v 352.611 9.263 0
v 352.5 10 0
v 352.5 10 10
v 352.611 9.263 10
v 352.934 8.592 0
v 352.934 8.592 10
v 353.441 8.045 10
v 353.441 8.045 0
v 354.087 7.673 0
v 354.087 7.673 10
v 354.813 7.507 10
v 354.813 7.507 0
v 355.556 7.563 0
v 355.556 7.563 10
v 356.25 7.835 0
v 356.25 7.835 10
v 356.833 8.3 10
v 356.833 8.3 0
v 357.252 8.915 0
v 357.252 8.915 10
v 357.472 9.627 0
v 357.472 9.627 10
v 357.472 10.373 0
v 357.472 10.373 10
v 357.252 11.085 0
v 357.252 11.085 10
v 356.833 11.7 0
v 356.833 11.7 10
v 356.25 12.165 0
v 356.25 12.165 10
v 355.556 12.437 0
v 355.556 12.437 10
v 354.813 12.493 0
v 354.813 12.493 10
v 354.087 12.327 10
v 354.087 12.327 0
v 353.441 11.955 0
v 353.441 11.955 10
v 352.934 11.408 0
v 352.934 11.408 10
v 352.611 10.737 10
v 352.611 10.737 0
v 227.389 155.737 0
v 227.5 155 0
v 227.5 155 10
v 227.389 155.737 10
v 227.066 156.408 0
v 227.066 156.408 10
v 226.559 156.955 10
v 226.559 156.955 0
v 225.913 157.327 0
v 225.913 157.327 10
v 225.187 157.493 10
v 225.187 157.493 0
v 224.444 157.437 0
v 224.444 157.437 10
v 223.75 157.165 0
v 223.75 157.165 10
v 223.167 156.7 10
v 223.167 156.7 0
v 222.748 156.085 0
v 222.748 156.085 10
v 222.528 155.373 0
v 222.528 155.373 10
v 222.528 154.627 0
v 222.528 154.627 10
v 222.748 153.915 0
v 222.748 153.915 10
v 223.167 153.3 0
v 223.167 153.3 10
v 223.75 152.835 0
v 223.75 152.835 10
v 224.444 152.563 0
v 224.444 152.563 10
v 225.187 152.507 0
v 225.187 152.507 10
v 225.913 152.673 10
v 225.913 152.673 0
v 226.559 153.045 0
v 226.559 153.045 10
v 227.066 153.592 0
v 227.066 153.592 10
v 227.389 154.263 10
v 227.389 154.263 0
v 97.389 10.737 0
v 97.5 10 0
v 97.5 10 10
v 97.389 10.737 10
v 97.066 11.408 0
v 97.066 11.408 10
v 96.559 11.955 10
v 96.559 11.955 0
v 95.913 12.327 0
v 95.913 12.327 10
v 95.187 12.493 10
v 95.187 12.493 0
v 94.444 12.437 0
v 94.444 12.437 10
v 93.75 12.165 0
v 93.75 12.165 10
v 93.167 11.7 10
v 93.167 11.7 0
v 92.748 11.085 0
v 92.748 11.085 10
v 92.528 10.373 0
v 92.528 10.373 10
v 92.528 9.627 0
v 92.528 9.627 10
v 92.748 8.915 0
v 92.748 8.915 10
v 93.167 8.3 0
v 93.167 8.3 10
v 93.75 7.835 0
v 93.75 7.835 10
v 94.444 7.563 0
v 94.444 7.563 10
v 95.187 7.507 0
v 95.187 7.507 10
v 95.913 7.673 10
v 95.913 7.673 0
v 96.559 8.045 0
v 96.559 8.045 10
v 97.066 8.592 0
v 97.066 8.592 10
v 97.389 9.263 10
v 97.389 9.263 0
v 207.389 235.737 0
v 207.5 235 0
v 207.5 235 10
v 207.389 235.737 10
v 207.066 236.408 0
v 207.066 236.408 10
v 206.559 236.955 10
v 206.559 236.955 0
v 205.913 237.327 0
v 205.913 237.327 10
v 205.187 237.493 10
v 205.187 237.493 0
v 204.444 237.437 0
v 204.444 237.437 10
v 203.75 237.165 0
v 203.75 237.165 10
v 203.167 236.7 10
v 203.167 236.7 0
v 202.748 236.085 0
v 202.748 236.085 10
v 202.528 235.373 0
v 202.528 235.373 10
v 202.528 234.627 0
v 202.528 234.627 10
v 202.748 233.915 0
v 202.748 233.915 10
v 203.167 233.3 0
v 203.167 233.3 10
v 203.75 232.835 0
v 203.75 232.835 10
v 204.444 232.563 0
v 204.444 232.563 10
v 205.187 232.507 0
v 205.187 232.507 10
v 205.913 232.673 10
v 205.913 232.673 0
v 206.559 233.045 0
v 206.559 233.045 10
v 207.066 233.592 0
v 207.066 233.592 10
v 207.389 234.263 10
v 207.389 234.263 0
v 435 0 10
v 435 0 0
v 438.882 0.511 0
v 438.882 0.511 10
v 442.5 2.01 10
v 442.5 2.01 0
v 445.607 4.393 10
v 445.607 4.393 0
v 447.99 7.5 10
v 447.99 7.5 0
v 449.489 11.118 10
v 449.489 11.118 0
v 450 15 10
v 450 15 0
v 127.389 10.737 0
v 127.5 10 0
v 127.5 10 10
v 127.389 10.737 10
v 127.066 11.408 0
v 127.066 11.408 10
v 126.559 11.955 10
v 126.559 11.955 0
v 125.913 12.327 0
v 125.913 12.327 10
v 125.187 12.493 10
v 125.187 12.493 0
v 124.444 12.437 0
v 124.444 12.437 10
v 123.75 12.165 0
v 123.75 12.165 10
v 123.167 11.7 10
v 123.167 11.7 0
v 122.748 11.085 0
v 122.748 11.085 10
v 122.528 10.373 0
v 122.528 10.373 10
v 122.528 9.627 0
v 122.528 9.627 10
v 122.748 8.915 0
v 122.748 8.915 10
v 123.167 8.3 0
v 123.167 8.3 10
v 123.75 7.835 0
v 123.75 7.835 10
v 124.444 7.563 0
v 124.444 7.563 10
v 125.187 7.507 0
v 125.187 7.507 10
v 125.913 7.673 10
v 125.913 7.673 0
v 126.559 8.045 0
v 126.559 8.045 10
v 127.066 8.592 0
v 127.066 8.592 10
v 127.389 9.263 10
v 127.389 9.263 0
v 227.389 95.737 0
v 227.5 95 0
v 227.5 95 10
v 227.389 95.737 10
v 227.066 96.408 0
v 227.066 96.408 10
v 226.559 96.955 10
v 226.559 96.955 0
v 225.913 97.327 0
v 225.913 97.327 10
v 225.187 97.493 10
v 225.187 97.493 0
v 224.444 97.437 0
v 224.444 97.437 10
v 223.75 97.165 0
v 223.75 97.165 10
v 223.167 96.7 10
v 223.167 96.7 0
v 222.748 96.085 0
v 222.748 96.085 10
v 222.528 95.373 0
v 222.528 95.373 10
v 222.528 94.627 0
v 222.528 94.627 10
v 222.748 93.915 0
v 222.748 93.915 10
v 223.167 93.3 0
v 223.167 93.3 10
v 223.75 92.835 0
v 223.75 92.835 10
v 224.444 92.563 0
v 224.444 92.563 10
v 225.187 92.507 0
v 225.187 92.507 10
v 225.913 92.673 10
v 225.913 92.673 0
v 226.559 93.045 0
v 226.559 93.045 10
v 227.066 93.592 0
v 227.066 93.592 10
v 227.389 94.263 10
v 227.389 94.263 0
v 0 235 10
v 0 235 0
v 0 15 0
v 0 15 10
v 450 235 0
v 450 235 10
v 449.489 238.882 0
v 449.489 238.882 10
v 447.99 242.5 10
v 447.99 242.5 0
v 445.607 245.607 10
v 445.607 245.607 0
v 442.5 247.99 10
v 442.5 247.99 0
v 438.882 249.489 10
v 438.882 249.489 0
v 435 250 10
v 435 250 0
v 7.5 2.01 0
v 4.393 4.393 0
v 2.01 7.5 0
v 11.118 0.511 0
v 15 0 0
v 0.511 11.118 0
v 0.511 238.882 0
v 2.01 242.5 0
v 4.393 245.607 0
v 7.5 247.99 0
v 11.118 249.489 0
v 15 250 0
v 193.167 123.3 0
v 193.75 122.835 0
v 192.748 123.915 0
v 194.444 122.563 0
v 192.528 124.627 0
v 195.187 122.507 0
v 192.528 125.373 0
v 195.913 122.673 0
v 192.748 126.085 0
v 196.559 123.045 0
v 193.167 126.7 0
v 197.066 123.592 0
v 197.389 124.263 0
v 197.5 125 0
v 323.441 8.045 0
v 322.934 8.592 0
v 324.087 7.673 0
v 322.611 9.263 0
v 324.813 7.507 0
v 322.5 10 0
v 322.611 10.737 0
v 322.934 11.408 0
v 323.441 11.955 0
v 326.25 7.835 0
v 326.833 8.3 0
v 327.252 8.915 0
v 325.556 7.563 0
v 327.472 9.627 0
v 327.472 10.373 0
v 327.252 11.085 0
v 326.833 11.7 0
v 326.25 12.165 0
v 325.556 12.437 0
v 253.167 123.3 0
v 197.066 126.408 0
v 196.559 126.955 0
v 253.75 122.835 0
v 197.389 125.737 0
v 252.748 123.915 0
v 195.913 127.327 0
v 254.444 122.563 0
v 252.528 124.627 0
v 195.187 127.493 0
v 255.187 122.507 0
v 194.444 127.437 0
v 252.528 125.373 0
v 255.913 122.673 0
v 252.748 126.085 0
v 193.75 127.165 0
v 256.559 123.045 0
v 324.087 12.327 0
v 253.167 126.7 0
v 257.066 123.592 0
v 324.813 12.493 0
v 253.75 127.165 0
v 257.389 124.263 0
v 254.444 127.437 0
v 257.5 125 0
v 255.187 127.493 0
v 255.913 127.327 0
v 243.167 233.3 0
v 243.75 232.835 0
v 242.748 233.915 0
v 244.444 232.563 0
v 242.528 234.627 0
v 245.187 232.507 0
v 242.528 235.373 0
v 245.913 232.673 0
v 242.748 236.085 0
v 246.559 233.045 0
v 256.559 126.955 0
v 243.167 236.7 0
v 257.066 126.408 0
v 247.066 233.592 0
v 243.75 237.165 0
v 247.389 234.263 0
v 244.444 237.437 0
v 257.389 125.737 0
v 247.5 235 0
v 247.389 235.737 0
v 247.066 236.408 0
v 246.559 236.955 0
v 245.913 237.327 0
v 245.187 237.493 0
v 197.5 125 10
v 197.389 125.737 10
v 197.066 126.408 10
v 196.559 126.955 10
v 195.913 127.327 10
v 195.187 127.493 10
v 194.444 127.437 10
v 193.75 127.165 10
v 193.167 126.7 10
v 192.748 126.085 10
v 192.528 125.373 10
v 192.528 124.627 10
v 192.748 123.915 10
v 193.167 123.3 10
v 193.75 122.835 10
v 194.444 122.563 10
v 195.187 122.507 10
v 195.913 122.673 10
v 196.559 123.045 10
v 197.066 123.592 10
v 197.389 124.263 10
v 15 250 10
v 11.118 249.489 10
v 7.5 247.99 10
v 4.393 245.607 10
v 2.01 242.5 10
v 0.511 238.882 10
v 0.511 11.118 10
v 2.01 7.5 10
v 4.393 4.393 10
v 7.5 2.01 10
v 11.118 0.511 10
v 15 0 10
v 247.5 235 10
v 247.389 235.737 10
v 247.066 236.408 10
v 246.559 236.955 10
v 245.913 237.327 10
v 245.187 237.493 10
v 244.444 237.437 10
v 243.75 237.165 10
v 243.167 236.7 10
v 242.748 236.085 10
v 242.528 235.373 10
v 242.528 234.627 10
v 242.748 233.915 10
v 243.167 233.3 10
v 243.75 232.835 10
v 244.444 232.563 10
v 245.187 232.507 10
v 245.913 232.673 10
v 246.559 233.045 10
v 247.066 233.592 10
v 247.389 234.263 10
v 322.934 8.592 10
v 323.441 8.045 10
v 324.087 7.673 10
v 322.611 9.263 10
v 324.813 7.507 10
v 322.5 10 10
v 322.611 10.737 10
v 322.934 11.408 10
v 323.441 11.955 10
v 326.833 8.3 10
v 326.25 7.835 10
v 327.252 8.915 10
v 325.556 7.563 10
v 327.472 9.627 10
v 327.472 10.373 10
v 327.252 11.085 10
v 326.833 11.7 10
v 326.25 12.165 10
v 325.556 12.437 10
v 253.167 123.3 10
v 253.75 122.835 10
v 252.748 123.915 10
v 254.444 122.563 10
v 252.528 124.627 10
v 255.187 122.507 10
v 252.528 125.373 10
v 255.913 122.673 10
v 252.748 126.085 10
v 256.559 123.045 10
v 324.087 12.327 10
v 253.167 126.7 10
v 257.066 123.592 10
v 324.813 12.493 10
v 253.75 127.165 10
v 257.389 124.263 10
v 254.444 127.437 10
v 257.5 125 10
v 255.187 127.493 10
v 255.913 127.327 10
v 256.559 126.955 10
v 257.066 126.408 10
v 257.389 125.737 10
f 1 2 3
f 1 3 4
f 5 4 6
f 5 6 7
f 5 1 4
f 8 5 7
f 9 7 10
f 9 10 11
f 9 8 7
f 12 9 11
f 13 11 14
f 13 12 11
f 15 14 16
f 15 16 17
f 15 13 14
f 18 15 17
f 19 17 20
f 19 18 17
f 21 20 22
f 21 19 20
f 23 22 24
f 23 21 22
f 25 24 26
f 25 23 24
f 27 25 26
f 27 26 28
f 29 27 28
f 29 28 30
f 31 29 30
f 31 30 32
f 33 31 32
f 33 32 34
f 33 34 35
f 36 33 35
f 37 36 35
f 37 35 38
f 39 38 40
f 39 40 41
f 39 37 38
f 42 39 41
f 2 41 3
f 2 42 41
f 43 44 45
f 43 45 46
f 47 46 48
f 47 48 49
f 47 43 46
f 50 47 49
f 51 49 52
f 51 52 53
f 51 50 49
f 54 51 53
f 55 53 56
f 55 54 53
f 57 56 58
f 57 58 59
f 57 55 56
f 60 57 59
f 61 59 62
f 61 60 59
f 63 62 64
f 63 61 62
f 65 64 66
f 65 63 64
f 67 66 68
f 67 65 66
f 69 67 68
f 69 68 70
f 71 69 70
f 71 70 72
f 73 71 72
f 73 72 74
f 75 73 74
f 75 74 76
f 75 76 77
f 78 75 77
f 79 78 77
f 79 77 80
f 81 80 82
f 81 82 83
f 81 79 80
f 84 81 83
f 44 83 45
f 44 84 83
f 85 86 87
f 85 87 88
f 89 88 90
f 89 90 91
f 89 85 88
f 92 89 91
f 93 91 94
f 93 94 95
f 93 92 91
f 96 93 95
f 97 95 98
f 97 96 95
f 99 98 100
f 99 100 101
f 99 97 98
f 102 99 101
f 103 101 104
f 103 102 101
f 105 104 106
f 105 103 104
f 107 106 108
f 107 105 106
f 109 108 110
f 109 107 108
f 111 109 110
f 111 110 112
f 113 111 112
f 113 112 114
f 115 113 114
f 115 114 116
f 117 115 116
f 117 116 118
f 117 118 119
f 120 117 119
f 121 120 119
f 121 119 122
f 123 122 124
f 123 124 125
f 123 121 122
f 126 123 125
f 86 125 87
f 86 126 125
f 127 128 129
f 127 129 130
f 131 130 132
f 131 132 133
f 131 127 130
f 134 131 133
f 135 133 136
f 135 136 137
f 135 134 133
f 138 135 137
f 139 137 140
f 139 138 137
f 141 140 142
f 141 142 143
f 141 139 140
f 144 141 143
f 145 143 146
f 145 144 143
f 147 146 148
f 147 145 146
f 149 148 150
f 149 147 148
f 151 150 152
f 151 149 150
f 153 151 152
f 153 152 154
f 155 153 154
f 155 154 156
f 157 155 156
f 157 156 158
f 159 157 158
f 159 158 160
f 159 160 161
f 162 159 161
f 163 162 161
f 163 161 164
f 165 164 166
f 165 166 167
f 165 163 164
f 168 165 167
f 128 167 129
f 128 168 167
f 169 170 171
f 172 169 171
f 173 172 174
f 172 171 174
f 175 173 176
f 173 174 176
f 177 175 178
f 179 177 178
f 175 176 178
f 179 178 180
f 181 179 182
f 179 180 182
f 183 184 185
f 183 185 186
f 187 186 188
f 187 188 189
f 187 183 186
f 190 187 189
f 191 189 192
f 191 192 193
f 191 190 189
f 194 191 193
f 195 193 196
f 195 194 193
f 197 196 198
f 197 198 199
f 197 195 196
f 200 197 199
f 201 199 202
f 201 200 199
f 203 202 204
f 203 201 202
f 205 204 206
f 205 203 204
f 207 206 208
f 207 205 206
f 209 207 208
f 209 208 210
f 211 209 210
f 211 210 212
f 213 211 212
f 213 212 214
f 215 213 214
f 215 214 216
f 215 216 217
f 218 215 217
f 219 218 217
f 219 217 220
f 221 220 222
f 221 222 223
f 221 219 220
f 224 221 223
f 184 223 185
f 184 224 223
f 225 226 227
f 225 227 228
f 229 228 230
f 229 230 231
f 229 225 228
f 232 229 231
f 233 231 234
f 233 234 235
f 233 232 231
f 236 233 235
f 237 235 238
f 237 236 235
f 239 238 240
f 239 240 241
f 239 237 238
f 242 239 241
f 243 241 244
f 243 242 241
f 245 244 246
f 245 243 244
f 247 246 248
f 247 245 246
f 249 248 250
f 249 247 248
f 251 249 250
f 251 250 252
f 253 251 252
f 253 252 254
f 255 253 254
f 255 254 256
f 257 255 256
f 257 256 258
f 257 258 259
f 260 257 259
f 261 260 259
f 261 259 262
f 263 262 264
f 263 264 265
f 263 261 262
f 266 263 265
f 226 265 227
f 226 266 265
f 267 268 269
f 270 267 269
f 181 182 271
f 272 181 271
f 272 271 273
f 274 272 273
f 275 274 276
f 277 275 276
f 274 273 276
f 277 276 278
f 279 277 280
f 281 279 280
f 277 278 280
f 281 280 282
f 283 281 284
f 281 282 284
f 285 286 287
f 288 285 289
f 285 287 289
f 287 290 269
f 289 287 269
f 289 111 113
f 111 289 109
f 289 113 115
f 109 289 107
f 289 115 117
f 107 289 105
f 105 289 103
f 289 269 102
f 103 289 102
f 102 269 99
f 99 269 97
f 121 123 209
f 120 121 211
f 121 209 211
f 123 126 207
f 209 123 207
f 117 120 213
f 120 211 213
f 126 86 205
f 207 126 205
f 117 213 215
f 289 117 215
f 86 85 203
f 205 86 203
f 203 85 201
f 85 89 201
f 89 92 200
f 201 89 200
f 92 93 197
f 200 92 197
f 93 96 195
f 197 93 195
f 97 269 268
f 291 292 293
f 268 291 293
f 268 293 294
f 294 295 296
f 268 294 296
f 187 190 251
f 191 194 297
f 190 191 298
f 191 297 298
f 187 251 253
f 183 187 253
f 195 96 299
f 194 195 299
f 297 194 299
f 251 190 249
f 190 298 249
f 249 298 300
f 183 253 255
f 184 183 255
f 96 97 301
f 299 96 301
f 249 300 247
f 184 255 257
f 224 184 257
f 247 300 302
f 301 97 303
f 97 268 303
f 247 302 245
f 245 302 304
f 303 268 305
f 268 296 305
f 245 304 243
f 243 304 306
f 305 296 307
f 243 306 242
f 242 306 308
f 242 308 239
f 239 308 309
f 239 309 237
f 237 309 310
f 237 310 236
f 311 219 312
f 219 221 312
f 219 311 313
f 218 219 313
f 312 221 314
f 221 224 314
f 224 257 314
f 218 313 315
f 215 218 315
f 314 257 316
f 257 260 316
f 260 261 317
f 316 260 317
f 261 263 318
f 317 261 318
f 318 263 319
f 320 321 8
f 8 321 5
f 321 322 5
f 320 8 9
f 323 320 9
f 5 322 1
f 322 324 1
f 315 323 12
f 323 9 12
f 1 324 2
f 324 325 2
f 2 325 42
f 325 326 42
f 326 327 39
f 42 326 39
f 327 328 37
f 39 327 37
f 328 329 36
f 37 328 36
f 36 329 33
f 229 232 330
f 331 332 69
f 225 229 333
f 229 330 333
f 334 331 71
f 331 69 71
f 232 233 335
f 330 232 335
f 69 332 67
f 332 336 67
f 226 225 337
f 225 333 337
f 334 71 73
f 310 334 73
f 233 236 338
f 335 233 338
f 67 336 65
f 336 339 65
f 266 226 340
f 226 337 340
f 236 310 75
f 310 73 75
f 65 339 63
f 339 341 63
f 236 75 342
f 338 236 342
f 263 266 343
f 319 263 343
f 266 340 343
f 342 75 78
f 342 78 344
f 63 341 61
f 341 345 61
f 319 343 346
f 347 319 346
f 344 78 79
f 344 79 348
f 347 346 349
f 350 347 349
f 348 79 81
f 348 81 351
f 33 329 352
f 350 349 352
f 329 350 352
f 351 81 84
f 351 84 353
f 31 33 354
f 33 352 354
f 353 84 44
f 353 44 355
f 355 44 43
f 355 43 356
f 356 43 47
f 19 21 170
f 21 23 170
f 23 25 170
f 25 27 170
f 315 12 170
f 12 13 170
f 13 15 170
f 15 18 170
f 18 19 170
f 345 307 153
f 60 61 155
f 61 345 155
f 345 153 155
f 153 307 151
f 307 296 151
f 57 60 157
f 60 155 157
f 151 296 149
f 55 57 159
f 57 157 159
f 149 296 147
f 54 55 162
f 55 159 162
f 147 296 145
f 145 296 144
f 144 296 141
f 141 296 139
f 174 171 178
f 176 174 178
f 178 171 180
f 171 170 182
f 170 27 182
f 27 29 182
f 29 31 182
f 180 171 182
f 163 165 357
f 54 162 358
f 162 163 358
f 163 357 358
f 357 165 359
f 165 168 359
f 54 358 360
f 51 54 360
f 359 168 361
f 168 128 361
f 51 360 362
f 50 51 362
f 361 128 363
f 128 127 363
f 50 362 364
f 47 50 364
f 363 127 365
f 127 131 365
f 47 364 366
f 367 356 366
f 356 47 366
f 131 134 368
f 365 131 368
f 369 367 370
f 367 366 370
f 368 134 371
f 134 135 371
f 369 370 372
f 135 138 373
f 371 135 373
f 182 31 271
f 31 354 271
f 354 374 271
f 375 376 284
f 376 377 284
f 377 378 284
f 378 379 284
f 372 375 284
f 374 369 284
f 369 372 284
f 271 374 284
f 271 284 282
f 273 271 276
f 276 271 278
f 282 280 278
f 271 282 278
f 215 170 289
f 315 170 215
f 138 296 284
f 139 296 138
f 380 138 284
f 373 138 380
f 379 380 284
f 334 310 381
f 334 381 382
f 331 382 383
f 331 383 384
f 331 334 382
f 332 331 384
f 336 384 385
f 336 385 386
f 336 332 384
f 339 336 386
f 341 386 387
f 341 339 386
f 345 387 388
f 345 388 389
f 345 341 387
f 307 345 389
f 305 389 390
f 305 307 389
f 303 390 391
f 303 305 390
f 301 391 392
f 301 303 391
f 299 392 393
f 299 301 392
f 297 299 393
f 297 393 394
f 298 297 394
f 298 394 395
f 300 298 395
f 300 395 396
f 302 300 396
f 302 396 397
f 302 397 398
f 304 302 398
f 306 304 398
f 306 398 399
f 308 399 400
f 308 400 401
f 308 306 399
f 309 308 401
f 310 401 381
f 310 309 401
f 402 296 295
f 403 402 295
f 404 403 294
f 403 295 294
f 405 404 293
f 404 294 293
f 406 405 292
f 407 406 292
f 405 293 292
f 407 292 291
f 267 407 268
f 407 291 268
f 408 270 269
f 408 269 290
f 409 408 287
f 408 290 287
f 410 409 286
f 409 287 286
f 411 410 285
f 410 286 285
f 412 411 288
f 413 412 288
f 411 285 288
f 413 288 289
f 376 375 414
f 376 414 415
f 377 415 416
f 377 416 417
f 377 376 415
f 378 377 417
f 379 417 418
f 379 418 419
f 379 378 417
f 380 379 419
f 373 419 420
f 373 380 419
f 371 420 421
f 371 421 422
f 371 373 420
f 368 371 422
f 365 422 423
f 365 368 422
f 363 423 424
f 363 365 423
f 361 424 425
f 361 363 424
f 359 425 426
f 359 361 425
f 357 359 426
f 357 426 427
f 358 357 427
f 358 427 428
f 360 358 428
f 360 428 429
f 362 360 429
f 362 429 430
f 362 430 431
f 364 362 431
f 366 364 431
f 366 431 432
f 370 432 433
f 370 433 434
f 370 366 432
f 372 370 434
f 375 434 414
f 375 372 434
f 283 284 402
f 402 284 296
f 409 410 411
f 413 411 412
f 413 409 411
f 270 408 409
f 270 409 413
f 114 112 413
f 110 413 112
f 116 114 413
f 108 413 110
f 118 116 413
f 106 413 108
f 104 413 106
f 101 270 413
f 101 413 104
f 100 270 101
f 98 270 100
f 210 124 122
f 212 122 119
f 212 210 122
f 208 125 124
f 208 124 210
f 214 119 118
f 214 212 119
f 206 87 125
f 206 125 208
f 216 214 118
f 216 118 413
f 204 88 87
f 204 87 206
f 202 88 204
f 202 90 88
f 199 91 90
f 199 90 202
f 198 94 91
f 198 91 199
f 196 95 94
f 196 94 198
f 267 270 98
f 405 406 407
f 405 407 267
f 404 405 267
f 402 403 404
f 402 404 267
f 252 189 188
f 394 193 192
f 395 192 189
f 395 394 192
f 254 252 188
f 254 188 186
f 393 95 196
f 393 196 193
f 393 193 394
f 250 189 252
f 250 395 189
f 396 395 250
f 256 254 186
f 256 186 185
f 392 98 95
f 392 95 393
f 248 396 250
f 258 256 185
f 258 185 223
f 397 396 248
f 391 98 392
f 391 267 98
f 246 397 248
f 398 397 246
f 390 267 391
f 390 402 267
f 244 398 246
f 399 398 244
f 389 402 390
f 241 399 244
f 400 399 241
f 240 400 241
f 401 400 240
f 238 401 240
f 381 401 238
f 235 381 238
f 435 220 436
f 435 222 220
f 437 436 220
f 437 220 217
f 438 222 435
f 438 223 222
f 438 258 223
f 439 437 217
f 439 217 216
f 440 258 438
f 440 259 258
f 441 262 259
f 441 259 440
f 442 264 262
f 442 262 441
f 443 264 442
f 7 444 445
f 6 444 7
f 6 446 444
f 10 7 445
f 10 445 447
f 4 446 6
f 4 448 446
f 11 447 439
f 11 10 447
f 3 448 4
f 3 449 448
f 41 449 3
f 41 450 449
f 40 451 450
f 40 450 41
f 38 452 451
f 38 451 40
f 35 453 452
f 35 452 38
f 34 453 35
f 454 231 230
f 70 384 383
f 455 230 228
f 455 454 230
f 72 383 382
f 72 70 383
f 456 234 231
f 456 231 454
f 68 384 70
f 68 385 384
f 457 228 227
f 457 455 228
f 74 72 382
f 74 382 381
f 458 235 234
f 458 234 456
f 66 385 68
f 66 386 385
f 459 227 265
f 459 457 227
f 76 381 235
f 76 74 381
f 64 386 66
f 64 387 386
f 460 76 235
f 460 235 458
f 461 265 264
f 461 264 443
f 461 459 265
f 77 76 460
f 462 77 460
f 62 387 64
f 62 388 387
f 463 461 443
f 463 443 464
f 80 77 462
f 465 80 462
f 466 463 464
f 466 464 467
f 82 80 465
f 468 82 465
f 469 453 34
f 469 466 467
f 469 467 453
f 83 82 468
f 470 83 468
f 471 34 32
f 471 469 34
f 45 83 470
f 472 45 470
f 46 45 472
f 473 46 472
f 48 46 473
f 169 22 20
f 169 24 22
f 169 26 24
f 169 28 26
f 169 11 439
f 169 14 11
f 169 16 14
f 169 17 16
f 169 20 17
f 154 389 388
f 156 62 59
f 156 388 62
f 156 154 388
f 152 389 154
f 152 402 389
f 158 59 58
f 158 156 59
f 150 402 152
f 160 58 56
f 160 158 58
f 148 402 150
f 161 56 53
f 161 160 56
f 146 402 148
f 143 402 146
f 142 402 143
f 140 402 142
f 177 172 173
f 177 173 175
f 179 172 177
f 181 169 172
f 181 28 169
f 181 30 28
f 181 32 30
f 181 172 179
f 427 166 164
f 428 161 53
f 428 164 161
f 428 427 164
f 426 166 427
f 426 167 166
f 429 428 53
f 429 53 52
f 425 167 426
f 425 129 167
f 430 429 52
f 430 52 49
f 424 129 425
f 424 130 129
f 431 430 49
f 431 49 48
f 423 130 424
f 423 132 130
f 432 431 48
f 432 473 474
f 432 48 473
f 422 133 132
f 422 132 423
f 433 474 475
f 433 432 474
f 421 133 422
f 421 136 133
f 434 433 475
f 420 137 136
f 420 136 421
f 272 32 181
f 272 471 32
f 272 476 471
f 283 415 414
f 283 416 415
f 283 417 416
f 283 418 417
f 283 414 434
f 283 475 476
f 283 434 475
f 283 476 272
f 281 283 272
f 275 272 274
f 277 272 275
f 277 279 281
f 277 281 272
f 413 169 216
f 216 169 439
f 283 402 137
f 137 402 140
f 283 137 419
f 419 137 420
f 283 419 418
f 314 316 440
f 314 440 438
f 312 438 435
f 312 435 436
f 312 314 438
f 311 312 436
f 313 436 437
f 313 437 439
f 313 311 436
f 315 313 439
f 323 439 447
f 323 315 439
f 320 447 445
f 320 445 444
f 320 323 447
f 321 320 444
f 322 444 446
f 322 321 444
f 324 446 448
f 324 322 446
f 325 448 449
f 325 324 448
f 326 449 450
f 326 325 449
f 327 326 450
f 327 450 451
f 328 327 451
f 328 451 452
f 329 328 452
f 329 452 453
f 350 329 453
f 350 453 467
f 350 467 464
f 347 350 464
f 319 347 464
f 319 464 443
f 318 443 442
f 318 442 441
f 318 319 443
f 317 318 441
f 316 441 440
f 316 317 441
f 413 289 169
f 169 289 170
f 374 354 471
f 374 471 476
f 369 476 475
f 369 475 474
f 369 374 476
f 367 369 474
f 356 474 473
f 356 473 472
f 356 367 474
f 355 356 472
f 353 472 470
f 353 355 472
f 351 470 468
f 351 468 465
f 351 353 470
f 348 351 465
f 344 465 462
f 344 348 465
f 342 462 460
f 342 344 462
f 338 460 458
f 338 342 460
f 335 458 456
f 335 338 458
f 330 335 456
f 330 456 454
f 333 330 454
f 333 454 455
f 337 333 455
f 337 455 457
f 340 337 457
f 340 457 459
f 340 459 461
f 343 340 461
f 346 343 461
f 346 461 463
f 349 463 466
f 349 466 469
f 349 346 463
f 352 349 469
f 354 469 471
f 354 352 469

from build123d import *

# Parameters (mm, degrees)
CROQUIS1_R              = 2.5
SALIENTE_EXTRUIR1_DEPTH = 10


with BuildPart() as part:
    # Croquis1 → Saliente-Extruir1 (new body)
    with BuildSketch(Plane.XY):
        with BuildLine():
            Line((15, 0), (435, 0))
            ThreePointArc((435, 0), (445.606601718, 4.393398282), (450, 15))
            Line((450, 15), (450, 235))
            ThreePointArc((450, 235), (445.606601718, 245.606601718), (435, 250))
            Line((435, 250), (15, 250))
            ThreePointArc((15, 250), (4.393398282, 245.606601718), (0, 235))
            Line((0, 235), (0, 15))
            ThreePointArc((0, 15), (4.393398282, 4.393398282), (15, 0))
        make_face()
        with Locations((255, 125)):
            Circle(CROQUIS1_R, mode=Mode.SUBTRACT)
        with Locations((225, 95)):
            Circle(CROQUIS1_R, mode=Mode.SUBTRACT)
        with Locations((195, 125)):
            Circle(CROQUIS1_R, mode=Mode.SUBTRACT)
        with Locations((225, 155)):
            Circle(CROQUIS1_R, mode=Mode.SUBTRACT)
        with Locations((125, 10)):
            Circle(CROQUIS1_R, mode=Mode.SUBTRACT)
        with Locations((95, 10)):
            Circle(CROQUIS1_R, mode=Mode.SUBTRACT)
        with Locations(Location((355, 10, 0), (0, 0, 180))):
            Circle(CROQUIS1_R, mode=Mode.SUBTRACT)
        with Locations(Location((325, 10, 0), (0, 0, 180))):
            Circle(CROQUIS1_R, mode=Mode.SUBTRACT)
        with Locations((245, 235)):
            Circle(CROQUIS1_R, mode=Mode.SUBTRACT)
        with Locations((205, 235)):
            Circle(CROQUIS1_R, mode=Mode.SUBTRACT)
    extrude(amount=SALIENTE_EXTRUIR1_DEPTH)


solid = part.part
